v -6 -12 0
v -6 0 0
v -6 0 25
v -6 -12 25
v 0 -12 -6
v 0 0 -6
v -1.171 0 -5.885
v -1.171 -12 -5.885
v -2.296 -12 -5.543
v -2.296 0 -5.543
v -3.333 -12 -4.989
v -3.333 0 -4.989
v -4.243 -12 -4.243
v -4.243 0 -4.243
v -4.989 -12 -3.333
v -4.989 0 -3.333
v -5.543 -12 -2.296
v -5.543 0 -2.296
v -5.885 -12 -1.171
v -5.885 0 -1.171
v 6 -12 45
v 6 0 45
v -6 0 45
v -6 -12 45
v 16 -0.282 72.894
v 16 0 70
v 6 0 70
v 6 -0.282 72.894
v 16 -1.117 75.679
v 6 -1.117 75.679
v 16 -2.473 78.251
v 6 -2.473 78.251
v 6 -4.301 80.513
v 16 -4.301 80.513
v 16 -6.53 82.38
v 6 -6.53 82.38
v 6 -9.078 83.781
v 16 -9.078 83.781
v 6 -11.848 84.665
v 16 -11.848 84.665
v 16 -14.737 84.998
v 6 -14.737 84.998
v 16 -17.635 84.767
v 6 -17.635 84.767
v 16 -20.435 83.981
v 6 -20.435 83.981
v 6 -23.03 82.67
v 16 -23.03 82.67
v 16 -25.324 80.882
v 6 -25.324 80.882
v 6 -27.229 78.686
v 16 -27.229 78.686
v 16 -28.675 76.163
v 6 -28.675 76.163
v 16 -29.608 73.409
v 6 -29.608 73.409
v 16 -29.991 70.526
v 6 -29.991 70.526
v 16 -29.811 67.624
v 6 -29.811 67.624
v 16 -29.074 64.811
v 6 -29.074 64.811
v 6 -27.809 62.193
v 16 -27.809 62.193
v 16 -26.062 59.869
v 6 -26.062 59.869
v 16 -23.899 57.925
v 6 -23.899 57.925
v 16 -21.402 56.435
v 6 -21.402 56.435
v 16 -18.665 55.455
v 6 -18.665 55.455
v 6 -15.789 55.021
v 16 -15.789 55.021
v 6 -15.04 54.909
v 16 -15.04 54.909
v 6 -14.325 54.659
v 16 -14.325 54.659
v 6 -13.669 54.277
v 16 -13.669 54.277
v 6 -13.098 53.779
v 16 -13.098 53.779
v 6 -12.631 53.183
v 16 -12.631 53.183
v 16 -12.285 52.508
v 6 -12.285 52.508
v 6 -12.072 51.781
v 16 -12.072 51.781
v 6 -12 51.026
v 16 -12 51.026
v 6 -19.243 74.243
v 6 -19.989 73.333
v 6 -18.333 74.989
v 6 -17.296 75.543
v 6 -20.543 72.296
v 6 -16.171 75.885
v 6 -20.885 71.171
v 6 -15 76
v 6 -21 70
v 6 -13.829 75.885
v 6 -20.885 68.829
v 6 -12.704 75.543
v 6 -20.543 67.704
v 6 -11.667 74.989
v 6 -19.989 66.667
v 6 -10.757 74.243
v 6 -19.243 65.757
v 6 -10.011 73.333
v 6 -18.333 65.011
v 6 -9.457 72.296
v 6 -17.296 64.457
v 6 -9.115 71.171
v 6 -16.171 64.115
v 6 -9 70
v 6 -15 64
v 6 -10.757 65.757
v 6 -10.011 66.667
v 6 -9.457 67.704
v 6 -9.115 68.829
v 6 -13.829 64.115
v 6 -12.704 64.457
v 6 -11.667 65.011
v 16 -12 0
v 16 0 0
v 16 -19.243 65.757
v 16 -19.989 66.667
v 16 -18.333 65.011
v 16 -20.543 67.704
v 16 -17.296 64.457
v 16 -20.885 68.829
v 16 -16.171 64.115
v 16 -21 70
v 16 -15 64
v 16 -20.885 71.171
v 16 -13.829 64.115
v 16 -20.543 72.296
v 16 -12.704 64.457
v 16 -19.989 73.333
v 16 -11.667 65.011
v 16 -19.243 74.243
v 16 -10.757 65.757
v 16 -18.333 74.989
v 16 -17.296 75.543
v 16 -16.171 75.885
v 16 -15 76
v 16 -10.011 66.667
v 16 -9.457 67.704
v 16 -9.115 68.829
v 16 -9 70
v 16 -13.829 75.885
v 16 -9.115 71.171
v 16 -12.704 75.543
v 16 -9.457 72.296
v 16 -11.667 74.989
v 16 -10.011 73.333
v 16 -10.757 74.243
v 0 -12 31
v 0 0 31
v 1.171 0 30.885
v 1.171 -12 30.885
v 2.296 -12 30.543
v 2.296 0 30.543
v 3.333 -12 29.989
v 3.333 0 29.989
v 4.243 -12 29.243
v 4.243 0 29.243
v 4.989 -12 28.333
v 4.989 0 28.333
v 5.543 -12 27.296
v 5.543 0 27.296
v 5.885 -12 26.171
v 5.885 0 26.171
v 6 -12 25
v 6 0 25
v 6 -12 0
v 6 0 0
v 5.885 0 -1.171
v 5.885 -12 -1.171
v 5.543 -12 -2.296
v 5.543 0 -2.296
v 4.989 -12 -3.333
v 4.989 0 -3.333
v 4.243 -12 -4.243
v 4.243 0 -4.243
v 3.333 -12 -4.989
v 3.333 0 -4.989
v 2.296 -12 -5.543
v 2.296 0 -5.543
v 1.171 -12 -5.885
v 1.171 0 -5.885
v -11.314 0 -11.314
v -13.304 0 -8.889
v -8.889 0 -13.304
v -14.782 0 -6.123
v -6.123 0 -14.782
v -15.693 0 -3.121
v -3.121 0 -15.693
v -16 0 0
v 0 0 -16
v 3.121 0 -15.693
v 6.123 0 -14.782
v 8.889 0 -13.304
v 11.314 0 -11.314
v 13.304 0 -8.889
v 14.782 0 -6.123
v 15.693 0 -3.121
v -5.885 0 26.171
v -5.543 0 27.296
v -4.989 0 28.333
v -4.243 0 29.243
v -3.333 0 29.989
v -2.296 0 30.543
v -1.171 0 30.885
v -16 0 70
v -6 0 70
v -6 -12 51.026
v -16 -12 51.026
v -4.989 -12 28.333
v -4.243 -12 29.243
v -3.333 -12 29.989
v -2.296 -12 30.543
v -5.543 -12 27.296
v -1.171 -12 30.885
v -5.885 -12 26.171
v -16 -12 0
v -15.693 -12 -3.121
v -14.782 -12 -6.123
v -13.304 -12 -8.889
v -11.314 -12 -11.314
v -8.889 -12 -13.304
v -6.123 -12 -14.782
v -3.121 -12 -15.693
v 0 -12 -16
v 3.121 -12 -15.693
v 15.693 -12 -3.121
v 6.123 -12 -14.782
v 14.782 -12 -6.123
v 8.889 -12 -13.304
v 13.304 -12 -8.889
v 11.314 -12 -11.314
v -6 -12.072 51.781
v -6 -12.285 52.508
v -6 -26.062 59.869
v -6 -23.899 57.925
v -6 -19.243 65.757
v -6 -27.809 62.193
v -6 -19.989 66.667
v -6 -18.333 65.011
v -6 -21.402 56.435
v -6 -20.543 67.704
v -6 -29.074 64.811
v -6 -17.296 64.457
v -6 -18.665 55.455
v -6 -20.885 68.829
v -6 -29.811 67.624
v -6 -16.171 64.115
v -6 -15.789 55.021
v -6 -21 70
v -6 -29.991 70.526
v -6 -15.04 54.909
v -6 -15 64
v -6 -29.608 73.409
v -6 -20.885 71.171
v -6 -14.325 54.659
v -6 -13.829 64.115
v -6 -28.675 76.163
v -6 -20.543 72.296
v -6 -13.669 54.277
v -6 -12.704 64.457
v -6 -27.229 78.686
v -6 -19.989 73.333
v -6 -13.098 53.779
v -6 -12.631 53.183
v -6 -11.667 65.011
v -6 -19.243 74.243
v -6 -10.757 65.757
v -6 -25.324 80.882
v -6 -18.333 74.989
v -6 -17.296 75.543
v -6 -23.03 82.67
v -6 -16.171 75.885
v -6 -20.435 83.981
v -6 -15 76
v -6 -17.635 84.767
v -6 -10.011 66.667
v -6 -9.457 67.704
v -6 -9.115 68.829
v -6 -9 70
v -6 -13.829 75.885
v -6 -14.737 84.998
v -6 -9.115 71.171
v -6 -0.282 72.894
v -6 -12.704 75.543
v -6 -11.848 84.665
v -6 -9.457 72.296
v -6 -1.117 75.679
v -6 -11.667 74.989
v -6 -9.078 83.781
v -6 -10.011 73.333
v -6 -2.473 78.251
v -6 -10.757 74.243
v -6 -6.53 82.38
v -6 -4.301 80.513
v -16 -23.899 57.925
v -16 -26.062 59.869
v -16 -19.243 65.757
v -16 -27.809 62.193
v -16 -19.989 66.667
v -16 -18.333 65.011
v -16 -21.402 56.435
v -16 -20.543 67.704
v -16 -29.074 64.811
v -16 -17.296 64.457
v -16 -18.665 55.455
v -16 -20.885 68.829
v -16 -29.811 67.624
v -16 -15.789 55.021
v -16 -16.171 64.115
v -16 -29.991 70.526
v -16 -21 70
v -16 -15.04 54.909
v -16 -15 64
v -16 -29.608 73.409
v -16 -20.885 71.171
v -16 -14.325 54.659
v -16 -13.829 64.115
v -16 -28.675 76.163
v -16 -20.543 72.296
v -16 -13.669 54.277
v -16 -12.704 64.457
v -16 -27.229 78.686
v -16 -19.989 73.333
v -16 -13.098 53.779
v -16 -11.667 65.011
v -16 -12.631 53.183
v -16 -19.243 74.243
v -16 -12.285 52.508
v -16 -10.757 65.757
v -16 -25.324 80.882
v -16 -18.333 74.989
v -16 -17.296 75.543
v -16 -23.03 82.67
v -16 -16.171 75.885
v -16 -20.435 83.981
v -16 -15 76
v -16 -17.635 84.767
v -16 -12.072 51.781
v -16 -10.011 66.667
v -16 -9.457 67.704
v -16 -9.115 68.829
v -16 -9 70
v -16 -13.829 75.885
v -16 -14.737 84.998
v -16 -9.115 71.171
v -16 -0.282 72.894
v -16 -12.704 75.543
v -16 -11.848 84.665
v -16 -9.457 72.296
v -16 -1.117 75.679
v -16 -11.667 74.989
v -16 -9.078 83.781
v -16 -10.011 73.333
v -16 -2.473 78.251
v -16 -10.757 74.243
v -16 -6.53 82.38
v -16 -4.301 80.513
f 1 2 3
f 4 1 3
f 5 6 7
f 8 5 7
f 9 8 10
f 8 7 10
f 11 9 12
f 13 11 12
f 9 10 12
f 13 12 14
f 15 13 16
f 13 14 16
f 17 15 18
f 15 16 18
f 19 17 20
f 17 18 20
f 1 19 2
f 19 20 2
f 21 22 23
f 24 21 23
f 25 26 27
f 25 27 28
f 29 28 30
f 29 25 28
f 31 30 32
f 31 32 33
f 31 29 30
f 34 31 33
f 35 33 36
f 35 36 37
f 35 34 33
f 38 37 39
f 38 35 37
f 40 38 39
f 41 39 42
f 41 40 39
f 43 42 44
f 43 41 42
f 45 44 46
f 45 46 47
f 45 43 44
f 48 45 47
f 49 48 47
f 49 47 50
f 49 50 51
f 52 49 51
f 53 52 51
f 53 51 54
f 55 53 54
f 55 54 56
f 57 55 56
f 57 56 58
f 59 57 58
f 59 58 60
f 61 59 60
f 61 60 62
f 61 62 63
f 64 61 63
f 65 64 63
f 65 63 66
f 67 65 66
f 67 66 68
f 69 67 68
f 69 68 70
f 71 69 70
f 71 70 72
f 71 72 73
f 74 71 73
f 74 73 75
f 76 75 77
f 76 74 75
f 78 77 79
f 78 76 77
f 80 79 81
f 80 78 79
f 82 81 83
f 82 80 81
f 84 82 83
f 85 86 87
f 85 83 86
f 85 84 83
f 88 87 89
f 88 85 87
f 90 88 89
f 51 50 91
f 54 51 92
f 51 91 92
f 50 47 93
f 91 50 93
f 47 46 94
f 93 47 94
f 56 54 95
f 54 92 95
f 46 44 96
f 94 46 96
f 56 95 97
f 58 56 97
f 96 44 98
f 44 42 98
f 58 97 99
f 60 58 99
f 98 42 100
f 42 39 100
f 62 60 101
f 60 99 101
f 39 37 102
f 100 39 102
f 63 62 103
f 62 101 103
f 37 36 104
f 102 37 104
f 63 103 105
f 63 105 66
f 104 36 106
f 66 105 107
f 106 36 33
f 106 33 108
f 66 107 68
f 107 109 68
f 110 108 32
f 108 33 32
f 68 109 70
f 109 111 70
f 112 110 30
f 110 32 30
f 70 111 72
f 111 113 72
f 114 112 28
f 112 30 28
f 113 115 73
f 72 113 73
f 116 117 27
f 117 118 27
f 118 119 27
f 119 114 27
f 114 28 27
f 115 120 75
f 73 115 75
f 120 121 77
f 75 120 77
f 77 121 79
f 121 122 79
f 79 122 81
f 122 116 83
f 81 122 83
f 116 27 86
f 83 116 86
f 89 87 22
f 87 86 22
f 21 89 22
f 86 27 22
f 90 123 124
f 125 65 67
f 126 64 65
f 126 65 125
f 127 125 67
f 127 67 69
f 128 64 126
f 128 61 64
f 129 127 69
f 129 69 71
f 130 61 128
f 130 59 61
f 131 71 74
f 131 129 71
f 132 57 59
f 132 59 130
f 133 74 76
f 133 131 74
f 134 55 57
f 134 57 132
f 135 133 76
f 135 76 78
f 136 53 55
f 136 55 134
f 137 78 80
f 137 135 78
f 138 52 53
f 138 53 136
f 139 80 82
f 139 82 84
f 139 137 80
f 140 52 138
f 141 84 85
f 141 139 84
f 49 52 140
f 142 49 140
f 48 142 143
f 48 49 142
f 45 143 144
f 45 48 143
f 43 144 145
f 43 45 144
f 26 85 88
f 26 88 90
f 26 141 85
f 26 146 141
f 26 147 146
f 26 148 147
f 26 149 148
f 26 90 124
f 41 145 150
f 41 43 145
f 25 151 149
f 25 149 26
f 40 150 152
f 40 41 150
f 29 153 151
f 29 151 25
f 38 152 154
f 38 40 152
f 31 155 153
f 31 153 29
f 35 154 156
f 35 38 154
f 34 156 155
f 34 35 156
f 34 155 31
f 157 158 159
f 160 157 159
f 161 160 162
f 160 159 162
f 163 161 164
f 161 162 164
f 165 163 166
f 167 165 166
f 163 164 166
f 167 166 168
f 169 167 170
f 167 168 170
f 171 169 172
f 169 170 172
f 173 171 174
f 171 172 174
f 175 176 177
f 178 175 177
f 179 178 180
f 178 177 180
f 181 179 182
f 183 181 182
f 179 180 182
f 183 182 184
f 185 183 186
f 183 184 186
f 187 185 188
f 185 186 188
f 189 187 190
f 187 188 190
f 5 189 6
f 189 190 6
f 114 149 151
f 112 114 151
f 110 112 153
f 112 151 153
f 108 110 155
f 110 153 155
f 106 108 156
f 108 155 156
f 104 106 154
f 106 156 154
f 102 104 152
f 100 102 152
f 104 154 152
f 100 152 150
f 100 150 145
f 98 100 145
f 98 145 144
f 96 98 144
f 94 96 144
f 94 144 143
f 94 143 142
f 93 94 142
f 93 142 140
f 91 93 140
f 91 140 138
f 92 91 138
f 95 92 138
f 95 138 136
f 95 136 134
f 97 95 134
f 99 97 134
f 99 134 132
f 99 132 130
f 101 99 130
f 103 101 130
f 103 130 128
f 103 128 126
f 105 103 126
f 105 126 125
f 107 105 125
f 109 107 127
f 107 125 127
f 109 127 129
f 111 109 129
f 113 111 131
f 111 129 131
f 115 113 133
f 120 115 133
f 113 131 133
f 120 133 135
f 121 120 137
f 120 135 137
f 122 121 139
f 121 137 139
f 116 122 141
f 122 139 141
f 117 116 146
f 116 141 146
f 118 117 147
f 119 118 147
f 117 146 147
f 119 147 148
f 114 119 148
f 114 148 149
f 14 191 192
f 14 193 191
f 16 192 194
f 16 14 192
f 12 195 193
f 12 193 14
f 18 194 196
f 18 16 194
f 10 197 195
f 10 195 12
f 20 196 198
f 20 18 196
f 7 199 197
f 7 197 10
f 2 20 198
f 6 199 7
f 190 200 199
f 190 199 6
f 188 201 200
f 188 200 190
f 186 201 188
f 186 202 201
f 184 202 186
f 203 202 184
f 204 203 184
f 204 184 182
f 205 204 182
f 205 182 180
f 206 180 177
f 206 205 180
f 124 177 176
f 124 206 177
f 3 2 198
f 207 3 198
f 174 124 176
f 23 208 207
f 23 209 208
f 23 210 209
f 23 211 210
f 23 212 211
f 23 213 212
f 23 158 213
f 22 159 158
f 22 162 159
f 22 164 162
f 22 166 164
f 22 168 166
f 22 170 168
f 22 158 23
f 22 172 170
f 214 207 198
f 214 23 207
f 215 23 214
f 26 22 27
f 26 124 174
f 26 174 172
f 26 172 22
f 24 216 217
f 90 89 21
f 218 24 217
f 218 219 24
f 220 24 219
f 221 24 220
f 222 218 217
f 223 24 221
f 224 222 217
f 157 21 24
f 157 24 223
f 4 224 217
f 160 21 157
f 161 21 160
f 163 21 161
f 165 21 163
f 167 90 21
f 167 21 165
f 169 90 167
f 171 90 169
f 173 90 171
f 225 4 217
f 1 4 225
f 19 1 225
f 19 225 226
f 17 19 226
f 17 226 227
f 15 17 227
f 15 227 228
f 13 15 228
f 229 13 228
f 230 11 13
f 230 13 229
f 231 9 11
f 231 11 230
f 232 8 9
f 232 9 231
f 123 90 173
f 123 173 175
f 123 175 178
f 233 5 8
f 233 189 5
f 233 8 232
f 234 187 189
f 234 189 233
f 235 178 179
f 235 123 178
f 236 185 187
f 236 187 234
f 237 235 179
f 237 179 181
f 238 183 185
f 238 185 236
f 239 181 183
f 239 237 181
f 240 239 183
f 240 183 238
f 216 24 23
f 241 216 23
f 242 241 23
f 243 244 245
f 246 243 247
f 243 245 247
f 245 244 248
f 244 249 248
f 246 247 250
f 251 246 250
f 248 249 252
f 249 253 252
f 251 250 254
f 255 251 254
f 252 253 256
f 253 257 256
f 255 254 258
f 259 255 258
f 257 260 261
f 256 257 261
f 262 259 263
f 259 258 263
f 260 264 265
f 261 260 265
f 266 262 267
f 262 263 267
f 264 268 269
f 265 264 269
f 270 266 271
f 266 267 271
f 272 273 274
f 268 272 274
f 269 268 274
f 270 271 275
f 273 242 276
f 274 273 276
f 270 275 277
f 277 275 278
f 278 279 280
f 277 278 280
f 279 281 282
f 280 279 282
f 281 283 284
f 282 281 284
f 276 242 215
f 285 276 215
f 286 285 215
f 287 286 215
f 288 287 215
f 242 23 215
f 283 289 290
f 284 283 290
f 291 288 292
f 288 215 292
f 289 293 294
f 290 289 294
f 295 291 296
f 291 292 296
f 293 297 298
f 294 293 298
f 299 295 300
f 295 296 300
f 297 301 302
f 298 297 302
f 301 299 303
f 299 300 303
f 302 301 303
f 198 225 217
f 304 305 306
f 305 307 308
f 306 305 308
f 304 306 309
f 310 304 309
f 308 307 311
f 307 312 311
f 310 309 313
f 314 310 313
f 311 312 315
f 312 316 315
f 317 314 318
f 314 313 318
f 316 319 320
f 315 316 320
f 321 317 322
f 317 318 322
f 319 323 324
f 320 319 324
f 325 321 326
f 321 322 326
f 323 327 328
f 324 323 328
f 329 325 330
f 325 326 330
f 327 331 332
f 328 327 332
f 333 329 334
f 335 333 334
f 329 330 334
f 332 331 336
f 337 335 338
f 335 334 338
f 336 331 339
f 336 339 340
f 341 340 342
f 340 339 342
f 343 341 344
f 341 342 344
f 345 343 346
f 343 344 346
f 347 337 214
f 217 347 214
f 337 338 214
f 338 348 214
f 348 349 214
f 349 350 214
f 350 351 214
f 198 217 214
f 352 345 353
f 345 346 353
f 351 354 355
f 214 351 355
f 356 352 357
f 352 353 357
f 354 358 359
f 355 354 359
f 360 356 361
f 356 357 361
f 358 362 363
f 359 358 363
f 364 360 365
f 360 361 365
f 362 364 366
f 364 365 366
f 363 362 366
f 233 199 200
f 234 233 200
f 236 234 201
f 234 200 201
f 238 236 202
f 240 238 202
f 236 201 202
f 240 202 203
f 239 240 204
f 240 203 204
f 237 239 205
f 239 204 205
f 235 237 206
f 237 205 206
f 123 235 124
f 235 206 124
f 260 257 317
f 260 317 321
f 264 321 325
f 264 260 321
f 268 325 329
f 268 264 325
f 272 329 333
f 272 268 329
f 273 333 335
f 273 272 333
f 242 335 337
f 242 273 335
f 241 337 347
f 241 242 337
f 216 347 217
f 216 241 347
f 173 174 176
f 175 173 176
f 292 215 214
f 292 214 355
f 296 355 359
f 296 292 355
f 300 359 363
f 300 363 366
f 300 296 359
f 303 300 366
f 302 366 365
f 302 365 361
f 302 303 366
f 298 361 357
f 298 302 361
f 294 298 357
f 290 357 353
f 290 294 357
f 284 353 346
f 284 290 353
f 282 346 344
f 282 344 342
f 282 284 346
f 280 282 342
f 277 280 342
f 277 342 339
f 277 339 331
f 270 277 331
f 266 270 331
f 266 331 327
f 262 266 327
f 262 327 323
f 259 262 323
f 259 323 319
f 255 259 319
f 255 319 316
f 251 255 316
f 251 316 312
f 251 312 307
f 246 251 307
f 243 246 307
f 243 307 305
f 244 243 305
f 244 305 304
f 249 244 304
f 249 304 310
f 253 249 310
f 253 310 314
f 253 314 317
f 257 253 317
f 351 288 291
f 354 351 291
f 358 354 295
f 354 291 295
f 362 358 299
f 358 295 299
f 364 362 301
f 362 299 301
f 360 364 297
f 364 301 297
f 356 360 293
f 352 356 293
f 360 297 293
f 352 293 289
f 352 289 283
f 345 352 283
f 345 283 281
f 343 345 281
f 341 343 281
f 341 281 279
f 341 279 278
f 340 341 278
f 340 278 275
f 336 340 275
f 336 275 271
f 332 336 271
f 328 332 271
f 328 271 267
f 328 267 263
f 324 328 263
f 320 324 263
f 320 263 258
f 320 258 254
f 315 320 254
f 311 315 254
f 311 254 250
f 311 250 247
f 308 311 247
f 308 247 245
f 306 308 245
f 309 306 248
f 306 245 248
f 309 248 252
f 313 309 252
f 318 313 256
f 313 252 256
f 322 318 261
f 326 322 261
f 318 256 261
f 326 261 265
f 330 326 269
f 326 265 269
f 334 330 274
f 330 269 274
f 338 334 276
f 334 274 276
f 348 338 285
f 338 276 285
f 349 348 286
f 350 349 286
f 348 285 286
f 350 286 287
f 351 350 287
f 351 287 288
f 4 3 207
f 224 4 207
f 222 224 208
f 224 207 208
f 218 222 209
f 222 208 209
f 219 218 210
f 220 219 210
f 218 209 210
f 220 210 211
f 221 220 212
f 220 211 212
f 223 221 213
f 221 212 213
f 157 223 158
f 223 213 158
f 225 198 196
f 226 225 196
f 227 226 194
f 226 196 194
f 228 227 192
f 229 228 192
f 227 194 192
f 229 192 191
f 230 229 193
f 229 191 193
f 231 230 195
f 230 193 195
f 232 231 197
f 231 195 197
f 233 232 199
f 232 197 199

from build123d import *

# Parameters (mm, degrees)
F1_DEPTH = 12
F2_R     = 6
F3_DEPTH = 32
F4_W     = 12
F4_H     = 27
F4_H_2   = 25
F5_DEPTH = 30.001


with BuildPart() as f1:
    # F0 (on Front) → F1 (new body)
    with BuildSketch(Plane.XZ):
        with BuildLine():
            Line((-16, 45), (-16, 0))
            ThreePointArc((-16, 0), (-11.313708, -11.313708), (0, -16))
            ThreePointArc((0, -16), (11.313708, -11.313708), (16, 0))
            Line((16, 0), (16, 45))
            Line((16, 45), (-16, 45))
        make_face()
        with BuildLine():
            ThreePointArc((0, -6), (-4.242641, -4.242641), (-6, 0))
            Line((-6, 0), (-6, 25))
            ThreePointArc((-6, 25), (-4.242641, 29.242641), (0, 31))
            ThreePointArc((0, 31), (4.242641, 29.242641), (6, 25))
            Line((6, 25), (6, 0))
            ThreePointArc((6, 0), (4.242641, -4.242641), (0, -6))
        make_face(mode=Mode.SUBTRACT)
    extrude(amount=F1_DEPTH)

    # F2 (on face) → F3 (join)
    with BuildSketch(Plane.YZ.offset(16)):
        with BuildLine():
            Line((0, 45), (0, 70))
            ThreePointArc((0, 70), (-25.323708, 80.882144), (-15.789474, 55.02079))
            ThreePointArc((-15.789474, 55.02079), (-13.098095, 53.779323), (-12, 51.026334))
            Line((-12, 51.026334), (-12, 45))
            Line((-12, 45), (0, 45))
        make_face()
        with Locations((-15, 70)):
            Circle(F2_R, mode=Mode.SUBTRACT)
    extrude(amount=-F3_DEPTH)

    # F4 (on face) → F5 (cut, through all)
    with BuildSketch(Plane(origin=(0, 0, 0), x_dir=(-1, 0, 0), z_dir=(0, 1, 0))):
        with Locations((0, 83.5)):
            Rectangle(F4_W, F4_H)
        with Locations((0, 57.5)):
            Rectangle(F4_W, F4_H_2)
    extrude(amount=-F5_DEPTH, mode=Mode.SUBTRACT)


solid = f1.part
